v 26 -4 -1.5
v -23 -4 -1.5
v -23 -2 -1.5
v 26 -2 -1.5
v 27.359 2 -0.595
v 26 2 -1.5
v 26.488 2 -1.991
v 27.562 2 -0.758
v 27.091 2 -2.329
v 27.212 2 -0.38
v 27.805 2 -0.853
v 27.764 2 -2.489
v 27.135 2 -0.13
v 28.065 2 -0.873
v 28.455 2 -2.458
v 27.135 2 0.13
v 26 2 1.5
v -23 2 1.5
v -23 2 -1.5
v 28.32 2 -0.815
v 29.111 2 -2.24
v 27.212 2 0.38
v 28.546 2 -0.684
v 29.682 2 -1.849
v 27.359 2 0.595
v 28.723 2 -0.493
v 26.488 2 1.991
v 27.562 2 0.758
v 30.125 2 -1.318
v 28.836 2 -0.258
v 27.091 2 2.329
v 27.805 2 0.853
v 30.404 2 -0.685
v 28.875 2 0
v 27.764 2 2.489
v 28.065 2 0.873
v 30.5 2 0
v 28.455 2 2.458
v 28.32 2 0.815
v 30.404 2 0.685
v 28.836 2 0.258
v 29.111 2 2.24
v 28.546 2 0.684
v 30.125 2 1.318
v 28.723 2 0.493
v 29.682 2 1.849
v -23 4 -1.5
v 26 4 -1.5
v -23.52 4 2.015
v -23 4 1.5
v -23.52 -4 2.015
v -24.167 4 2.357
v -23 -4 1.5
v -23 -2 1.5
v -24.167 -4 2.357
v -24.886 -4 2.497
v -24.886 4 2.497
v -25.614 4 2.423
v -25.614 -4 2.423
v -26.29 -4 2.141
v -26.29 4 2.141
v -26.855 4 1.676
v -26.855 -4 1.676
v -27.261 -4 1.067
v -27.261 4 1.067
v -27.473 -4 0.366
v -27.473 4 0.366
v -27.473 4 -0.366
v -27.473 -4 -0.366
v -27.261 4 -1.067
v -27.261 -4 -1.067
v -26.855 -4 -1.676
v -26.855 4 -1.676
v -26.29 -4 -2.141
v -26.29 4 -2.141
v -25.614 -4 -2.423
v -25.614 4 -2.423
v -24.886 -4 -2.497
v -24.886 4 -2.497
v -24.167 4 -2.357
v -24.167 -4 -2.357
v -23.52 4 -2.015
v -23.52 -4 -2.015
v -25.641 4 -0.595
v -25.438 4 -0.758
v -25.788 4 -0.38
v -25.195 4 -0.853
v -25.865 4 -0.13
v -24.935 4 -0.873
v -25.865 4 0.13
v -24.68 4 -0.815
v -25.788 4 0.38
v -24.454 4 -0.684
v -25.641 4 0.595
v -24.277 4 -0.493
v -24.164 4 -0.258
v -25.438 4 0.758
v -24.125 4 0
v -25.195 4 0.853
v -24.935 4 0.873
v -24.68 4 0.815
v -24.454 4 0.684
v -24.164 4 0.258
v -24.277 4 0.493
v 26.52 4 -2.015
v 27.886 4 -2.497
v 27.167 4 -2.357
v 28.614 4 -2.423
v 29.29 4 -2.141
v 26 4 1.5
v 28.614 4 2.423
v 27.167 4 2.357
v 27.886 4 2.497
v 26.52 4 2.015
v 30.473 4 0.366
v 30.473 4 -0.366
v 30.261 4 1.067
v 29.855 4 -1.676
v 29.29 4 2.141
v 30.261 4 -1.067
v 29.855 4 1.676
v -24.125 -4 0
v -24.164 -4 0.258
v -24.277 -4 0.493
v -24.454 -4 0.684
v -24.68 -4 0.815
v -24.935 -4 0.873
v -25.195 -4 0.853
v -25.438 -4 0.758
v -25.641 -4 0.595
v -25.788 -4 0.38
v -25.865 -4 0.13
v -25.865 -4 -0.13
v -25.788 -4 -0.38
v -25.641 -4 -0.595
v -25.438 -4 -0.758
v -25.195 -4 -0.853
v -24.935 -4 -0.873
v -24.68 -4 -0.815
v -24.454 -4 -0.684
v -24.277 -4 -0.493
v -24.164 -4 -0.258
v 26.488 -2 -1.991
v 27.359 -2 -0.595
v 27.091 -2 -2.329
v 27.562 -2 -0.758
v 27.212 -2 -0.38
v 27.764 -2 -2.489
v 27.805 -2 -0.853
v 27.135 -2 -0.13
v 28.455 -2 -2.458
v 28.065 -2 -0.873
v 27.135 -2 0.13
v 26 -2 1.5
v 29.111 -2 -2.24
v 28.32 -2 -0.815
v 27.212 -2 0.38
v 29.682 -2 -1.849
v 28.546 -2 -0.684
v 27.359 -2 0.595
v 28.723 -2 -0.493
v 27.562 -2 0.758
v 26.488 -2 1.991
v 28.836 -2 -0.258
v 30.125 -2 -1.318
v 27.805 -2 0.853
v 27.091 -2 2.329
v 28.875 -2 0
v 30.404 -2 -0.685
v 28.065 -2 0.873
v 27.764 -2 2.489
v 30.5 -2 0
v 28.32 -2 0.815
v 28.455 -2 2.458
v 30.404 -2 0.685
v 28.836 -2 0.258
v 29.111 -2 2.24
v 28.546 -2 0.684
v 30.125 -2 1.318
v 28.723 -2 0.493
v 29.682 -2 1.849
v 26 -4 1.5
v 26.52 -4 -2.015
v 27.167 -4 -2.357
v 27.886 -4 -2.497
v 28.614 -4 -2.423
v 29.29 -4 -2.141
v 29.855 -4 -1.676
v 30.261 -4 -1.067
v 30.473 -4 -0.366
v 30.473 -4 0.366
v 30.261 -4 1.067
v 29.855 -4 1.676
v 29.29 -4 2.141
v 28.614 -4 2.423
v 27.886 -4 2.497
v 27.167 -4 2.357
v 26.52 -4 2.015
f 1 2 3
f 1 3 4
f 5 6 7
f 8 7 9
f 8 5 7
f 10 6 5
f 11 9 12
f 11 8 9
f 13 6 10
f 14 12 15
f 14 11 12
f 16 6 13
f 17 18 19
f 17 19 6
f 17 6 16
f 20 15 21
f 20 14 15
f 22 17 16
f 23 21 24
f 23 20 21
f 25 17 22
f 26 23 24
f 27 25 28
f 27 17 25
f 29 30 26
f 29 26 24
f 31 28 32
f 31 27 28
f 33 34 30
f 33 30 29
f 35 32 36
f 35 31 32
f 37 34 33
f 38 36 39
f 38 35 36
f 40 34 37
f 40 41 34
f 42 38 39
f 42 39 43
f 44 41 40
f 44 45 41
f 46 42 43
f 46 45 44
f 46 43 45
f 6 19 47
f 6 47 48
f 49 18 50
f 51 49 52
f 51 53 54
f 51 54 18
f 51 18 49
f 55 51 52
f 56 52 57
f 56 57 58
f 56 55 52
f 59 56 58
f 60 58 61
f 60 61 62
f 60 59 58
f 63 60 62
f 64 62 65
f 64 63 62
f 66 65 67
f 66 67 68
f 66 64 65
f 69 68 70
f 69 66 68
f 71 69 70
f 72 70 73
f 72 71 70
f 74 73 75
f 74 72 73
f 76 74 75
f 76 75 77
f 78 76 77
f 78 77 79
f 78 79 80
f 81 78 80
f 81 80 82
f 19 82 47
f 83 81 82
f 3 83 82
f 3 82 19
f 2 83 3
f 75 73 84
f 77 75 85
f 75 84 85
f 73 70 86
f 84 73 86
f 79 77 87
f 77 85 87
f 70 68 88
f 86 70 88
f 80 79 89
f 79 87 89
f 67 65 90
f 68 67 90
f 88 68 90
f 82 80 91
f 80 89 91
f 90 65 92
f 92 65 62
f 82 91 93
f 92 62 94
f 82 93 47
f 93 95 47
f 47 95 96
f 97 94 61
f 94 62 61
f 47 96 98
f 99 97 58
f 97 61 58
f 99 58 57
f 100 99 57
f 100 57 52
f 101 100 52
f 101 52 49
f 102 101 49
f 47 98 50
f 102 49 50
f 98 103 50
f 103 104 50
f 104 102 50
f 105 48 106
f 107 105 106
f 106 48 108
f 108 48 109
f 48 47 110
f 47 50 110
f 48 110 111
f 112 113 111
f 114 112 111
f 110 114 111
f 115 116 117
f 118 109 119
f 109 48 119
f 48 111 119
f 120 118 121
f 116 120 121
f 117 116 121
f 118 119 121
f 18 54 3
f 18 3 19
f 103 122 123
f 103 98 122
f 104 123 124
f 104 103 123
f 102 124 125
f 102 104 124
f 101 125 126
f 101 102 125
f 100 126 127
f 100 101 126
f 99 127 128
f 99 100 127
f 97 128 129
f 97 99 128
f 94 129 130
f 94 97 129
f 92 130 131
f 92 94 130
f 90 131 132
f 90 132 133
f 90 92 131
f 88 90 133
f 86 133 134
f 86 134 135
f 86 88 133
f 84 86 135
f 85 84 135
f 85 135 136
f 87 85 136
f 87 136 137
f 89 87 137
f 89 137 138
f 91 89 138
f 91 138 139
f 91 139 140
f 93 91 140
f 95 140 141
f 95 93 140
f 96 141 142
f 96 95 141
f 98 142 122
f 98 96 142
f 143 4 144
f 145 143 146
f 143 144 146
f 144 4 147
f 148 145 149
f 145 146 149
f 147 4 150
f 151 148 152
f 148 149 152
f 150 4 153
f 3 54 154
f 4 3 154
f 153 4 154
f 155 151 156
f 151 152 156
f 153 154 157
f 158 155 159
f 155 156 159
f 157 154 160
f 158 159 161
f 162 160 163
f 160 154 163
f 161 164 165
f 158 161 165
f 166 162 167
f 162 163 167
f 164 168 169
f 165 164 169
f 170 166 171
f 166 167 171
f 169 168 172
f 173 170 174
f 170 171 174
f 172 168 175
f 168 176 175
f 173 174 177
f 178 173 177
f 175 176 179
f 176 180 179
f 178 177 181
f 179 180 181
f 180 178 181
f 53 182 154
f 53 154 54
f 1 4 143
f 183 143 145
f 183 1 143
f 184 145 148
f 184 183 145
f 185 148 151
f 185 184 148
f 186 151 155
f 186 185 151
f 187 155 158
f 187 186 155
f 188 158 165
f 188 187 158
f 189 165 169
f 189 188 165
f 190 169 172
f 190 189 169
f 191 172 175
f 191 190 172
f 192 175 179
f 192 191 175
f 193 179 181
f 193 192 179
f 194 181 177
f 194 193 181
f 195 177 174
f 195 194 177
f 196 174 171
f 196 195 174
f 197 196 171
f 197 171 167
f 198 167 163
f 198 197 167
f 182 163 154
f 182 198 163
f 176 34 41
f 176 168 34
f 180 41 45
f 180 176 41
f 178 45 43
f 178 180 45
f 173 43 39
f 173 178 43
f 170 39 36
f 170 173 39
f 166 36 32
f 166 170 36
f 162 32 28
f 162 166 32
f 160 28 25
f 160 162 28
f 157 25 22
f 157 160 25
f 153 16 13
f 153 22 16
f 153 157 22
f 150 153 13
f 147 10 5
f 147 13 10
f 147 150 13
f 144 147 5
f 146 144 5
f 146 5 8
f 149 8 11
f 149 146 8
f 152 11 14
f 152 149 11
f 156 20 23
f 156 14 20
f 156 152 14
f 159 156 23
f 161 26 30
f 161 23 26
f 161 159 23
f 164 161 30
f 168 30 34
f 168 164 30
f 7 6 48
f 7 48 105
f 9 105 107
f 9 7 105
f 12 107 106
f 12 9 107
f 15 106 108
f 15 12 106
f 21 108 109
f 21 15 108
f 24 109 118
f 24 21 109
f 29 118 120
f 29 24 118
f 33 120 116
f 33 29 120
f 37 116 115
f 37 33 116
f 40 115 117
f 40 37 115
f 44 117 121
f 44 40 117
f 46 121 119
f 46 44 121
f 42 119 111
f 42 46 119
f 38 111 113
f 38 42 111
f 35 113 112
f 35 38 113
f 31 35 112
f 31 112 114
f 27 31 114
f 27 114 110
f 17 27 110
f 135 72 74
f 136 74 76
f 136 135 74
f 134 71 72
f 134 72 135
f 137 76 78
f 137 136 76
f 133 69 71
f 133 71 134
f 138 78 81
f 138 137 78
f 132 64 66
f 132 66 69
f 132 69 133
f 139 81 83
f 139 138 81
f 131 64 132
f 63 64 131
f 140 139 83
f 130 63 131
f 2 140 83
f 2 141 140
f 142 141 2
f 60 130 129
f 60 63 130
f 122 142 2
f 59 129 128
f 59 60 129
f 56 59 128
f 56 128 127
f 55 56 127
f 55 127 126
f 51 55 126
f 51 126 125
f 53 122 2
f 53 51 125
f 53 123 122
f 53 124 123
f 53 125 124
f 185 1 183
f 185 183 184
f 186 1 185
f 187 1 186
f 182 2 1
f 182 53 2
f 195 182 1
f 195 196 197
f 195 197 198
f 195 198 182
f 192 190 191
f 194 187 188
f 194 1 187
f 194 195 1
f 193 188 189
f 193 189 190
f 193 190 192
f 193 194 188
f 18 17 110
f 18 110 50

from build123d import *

# Parameters (mm, degrees)
F0_R     = 0.875
F1_DEPTH = 4
F3_DEPTH = 2
F4_DEPTH = 4
F5_W     = 49
F5_H     = 4
F6_DEPTH = 2.5


with BuildPart() as f1:
    # F0 (on Front) → F1 (new body, symmetric)
    with BuildSketch(Plane.XZ):
        with BuildLine():
            ThreePointArc((-23, 1.5), (-27.5, 0), (-23, -1.5))
            Line((-23, -1.5), (26, -1.5))
            ThreePointArc((26, -1.5), (30.5, 0), (26, 1.5))
            Line((26, 1.5), (-23, 1.5))
        make_face()
        with Locations((-25, 0)):
            Circle(F0_R, mode=Mode.SUBTRACT)
        with Locations((28, 0)):
            Circle(F0_R, mode=Mode.SUBTRACT)
    extrude(amount=F1_DEPTH, both=True)

    # F2 (on Front) → F3 (cut, symmetric)
    with BuildSketch(Plane.XZ):
        with BuildLine():
            ThreePointArc((26, -1.5), (28.790569, -2.371708), (30.5, 0))
            ThreePointArc((30.5, 0), (28.790569, 2.371708), (26, 1.5))
            ThreePointArc((26, 1.5), (25.5, 0), (26, -1.5))
        make_face()
    extrude(amount=F3_DEPTH, both=True, mode=Mode.SUBTRACT)

    # F0 (on Front) → F4 (join, symmetric)
    with BuildSketch(Plane.XZ):
        with Locations((28, 0)):
            Circle(F0_R)
    extrude(amount=F4_DEPTH, both=True)

    # F5 (on Top) → F6 (cut, symmetric)
    with BuildSketch(Plane.XY):
        with Locations((1.5, 0)):
            Rectangle(F5_W, F5_H)
    extrude(amount=F6_DEPTH, both=True, mode=Mode.SUBTRACT)


solid = f1.part
